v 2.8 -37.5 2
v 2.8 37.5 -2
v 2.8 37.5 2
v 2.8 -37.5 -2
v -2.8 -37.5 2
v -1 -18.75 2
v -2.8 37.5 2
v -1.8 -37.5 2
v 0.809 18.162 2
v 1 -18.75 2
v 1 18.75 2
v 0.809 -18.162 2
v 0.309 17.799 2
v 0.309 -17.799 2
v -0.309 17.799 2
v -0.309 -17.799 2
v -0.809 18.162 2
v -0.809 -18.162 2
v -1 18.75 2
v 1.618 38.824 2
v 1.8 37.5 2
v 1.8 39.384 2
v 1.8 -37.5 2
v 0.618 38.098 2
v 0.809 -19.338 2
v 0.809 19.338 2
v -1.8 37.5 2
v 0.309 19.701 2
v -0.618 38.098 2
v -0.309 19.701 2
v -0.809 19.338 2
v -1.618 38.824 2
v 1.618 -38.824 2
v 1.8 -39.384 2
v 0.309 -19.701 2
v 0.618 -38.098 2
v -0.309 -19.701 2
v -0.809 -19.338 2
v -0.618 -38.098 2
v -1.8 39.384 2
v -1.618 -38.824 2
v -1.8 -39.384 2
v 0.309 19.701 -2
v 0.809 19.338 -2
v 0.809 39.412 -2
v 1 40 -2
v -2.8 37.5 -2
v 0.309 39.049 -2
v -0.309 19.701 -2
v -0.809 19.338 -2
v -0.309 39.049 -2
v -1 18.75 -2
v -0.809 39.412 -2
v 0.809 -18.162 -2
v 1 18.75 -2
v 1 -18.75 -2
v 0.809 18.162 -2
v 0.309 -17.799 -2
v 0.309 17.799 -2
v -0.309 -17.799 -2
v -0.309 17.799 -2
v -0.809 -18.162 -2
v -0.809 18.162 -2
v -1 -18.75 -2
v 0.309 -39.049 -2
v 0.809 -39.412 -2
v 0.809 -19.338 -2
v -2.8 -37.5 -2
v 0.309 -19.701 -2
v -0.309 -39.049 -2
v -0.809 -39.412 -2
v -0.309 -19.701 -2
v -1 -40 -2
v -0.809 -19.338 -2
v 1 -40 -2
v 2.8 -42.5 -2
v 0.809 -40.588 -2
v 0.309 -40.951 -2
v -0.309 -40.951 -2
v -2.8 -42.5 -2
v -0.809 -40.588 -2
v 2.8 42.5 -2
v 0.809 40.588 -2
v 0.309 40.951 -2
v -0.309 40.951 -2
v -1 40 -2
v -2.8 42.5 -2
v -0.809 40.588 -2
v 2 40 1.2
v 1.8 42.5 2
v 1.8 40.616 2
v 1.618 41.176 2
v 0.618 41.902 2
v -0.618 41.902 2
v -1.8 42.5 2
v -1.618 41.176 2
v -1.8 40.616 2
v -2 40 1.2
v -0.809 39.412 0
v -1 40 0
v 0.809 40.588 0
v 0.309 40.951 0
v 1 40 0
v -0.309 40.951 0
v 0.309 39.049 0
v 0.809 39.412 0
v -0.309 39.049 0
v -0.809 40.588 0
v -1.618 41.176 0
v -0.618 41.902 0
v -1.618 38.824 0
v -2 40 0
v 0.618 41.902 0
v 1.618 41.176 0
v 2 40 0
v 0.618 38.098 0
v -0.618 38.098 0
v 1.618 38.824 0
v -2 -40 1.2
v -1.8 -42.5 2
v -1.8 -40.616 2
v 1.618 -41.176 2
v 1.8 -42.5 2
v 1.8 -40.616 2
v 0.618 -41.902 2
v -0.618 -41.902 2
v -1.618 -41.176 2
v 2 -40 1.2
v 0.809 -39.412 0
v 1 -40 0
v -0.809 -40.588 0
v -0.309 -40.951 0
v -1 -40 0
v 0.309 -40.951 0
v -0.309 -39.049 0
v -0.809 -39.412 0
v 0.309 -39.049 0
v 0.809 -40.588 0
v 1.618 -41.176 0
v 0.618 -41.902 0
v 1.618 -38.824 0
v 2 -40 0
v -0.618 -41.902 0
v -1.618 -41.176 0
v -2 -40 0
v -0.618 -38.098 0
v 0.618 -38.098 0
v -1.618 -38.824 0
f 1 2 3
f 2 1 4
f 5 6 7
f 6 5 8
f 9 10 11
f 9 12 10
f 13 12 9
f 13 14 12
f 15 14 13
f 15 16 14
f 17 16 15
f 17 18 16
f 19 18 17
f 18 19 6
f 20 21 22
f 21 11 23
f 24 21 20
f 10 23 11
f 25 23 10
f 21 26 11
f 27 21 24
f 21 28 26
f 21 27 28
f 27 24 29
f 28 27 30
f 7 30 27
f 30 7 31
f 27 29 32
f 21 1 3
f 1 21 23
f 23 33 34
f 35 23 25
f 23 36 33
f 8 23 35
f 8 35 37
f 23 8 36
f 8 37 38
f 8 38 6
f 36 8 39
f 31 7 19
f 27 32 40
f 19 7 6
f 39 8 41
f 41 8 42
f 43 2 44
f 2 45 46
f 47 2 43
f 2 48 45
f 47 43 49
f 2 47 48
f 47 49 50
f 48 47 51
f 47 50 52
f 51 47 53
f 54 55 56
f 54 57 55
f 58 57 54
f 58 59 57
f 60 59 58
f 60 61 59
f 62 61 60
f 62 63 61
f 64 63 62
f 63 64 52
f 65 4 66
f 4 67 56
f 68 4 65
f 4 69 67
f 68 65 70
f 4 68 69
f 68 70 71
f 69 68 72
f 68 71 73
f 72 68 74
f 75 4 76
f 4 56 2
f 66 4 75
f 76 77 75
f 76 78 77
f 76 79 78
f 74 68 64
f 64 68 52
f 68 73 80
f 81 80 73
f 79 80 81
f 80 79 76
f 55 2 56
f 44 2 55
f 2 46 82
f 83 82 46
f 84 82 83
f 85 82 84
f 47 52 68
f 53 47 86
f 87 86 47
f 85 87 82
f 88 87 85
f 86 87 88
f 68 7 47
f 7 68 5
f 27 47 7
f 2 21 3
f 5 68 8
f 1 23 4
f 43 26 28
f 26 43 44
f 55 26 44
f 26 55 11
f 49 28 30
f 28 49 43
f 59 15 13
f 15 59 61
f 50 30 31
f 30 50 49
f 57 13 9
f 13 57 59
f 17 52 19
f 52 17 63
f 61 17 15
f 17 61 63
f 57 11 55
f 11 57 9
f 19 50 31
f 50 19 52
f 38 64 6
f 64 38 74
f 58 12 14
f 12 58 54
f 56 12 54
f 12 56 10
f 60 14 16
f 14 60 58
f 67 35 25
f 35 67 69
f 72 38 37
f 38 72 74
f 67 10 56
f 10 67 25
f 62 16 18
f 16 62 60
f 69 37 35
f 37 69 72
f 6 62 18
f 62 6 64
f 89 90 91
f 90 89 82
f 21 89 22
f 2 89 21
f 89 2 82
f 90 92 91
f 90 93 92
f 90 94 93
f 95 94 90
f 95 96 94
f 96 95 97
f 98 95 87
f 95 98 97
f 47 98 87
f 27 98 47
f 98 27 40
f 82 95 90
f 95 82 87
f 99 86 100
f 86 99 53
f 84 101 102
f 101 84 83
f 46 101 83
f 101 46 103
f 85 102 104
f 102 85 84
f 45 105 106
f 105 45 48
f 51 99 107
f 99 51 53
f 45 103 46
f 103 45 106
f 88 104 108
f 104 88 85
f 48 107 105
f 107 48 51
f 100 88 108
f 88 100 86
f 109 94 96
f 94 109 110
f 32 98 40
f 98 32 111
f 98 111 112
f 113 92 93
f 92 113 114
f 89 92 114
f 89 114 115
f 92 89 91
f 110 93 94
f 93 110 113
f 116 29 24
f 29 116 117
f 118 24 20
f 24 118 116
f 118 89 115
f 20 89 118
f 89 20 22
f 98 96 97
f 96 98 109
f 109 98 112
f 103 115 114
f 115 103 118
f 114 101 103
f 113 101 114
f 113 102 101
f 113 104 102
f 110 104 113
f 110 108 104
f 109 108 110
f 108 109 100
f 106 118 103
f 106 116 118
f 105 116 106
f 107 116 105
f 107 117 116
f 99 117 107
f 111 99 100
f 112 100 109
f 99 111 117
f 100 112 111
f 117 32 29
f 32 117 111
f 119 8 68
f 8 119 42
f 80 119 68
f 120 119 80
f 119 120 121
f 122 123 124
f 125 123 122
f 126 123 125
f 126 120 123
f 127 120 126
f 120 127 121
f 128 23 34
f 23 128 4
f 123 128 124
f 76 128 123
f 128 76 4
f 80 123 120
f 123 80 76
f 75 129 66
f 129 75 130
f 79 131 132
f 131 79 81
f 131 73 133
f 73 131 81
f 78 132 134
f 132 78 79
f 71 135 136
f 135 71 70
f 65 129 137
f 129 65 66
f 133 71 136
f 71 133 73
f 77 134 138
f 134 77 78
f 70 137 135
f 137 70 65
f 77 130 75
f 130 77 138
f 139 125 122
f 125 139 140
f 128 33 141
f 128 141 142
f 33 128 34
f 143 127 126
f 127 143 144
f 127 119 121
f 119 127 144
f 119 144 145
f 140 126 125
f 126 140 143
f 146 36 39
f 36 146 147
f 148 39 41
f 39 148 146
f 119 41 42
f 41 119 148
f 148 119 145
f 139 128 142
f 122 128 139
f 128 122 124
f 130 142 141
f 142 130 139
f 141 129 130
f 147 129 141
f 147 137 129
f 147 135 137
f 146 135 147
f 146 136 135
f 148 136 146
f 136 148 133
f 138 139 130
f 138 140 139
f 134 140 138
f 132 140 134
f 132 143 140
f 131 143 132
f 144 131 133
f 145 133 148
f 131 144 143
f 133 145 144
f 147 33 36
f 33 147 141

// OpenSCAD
// file: TrapezioIsoceles.scad
module TrapezioIsoceles(profundidade,largura,altura,deslocamento) {

//altura = 4;
//profundidade = 5; 
//largura = 6;
//deslocamento = 1; 
//altura=altura+0.2;
deslocamentoZ = -altura/2;
deslocamentoX = -largura/2; 
deslocamentoY = -profundidade/2;

pontosTrapezio = [
  [ deslocamentoX, deslocamentoY,  deslocamentoZ ],  //0
  [ deslocamentoX+largura, deslocamentoY,  deslocamentoZ ],  //1
  [ deslocamentoX+largura, deslocamentoY+profundidade,  deslocamentoZ ],  //2
  [ deslocamentoX+0, deslocamentoY+profundidade, deslocamentoZ ],  //3
  [ deslocamentoX+deslocamento,  deslocamentoY, deslocamentoZ+altura ],  //4
  [ deslocamentoX+largura-deslocamento,  deslocamentoY, deslocamentoZ+altura ],  //5
  [ deslocamentoX+largura-deslocamento,deslocamentoY+profundidade, deslocamentoZ+altura ],  //6
  [ deslocamentoX+deslocamento,  deslocamentoY+profundidade, deslocamentoZ+altura ]]; //7
  
facesTrapezio = [
  [0,1,2,3],  // bottom
  [4,5,1,0],  // front
  [7,6,5,4],  // top
  [5,6,2,1],  // right
  [6,7,3,2],  // back
  [7,4,0,3]]; // left
  
polyhedron( pontosTrapezio, facesTrapezio );


//polygon([[0,0],[5,0],[4,3],[1,3]]);

//cube([17,17,3]);
}
// file: TrapezioFurado.scad
use <TrapezioIsoceles.scad>


module TrapezioFurado(profundidade,largura,altura) {

    //altura = 4; 
    tamCubo = 24; 
    deslocamento = 1;

    //profundidade = 5; 
    //largura = 6; 
    posTrapezio = tamCubo/2 - altura/2;
    hFuros = profundidade;

    difference() {
        TrapezioIsoceles(profundidade,largura,altura,deslocamento); 

        cylinder (altura+0.1, r=1, center = true, $fn=10);
        translate([0,0,altura-2])
        cylinder (altura, r=2, center = true, $fn=10);
    }
}

//TrapezioFurado(5,5,4); 
// file: Haste.scad
use <TrapezioFurado.scad>
use <TrapezioIsoceles.scad>

module Haste(largura,altura,comprimento,suportes) {
 
profundidadeTrapezio = 5; 
larguraTrapezio = largura; 

if (suportes) {
// Suportes laterais 
for (a = [0:180:181]) {
    rotate([0,0,a])
    translate([profundidadeTrapezio/2+altura/2-1,0,0]) {
        difference(){
            cube([altura-1,larguraTrapezio+8,altura],true);
            rotate([90,0,90])
            TrapezioIsoceles(profundidadeTrapezio,largura+1,altura,1);
        }

    }
}
}
// Haste principal furada 
difference() {
    cube([largura,comprimento,altura],true);
    if (suportes) {
    rotate([0,90,0]) 
    cylinder (larguraTrapezio+1, r=1, center = true, $fn=10);
    }
    translate([0,comprimento/4,0])   
    cylinder (larguraTrapezio+1, r=1, center = true, $fn=10);
    translate([0,-comprimento/4,0])   
    cylinder (larguraTrapezio+1, r=1, center = true, $fn=10);
}

// Extremidades da haste 
for (a = [0:180:181]) {
    rotate([0,0,a])
    translate([0,comprimento/2+profundidadeTrapezio/2 ,0])
    TrapezioFurado(profundidadeTrapezio,larguraTrapezio,altura);  
}
}

//Haste(5.6,4,30,false); 
// main file
use <Haste.scad> 


tamanho = 75;
altura = 4; 
largura = 5.6; 
suporte_lateral = false; 

// Gera uma haste com as propriedades descritas nas variáveis 'largura', 'altura' e 'tamanho'. 
Haste(largura,altura,tamanho,suporte_lateral); 
